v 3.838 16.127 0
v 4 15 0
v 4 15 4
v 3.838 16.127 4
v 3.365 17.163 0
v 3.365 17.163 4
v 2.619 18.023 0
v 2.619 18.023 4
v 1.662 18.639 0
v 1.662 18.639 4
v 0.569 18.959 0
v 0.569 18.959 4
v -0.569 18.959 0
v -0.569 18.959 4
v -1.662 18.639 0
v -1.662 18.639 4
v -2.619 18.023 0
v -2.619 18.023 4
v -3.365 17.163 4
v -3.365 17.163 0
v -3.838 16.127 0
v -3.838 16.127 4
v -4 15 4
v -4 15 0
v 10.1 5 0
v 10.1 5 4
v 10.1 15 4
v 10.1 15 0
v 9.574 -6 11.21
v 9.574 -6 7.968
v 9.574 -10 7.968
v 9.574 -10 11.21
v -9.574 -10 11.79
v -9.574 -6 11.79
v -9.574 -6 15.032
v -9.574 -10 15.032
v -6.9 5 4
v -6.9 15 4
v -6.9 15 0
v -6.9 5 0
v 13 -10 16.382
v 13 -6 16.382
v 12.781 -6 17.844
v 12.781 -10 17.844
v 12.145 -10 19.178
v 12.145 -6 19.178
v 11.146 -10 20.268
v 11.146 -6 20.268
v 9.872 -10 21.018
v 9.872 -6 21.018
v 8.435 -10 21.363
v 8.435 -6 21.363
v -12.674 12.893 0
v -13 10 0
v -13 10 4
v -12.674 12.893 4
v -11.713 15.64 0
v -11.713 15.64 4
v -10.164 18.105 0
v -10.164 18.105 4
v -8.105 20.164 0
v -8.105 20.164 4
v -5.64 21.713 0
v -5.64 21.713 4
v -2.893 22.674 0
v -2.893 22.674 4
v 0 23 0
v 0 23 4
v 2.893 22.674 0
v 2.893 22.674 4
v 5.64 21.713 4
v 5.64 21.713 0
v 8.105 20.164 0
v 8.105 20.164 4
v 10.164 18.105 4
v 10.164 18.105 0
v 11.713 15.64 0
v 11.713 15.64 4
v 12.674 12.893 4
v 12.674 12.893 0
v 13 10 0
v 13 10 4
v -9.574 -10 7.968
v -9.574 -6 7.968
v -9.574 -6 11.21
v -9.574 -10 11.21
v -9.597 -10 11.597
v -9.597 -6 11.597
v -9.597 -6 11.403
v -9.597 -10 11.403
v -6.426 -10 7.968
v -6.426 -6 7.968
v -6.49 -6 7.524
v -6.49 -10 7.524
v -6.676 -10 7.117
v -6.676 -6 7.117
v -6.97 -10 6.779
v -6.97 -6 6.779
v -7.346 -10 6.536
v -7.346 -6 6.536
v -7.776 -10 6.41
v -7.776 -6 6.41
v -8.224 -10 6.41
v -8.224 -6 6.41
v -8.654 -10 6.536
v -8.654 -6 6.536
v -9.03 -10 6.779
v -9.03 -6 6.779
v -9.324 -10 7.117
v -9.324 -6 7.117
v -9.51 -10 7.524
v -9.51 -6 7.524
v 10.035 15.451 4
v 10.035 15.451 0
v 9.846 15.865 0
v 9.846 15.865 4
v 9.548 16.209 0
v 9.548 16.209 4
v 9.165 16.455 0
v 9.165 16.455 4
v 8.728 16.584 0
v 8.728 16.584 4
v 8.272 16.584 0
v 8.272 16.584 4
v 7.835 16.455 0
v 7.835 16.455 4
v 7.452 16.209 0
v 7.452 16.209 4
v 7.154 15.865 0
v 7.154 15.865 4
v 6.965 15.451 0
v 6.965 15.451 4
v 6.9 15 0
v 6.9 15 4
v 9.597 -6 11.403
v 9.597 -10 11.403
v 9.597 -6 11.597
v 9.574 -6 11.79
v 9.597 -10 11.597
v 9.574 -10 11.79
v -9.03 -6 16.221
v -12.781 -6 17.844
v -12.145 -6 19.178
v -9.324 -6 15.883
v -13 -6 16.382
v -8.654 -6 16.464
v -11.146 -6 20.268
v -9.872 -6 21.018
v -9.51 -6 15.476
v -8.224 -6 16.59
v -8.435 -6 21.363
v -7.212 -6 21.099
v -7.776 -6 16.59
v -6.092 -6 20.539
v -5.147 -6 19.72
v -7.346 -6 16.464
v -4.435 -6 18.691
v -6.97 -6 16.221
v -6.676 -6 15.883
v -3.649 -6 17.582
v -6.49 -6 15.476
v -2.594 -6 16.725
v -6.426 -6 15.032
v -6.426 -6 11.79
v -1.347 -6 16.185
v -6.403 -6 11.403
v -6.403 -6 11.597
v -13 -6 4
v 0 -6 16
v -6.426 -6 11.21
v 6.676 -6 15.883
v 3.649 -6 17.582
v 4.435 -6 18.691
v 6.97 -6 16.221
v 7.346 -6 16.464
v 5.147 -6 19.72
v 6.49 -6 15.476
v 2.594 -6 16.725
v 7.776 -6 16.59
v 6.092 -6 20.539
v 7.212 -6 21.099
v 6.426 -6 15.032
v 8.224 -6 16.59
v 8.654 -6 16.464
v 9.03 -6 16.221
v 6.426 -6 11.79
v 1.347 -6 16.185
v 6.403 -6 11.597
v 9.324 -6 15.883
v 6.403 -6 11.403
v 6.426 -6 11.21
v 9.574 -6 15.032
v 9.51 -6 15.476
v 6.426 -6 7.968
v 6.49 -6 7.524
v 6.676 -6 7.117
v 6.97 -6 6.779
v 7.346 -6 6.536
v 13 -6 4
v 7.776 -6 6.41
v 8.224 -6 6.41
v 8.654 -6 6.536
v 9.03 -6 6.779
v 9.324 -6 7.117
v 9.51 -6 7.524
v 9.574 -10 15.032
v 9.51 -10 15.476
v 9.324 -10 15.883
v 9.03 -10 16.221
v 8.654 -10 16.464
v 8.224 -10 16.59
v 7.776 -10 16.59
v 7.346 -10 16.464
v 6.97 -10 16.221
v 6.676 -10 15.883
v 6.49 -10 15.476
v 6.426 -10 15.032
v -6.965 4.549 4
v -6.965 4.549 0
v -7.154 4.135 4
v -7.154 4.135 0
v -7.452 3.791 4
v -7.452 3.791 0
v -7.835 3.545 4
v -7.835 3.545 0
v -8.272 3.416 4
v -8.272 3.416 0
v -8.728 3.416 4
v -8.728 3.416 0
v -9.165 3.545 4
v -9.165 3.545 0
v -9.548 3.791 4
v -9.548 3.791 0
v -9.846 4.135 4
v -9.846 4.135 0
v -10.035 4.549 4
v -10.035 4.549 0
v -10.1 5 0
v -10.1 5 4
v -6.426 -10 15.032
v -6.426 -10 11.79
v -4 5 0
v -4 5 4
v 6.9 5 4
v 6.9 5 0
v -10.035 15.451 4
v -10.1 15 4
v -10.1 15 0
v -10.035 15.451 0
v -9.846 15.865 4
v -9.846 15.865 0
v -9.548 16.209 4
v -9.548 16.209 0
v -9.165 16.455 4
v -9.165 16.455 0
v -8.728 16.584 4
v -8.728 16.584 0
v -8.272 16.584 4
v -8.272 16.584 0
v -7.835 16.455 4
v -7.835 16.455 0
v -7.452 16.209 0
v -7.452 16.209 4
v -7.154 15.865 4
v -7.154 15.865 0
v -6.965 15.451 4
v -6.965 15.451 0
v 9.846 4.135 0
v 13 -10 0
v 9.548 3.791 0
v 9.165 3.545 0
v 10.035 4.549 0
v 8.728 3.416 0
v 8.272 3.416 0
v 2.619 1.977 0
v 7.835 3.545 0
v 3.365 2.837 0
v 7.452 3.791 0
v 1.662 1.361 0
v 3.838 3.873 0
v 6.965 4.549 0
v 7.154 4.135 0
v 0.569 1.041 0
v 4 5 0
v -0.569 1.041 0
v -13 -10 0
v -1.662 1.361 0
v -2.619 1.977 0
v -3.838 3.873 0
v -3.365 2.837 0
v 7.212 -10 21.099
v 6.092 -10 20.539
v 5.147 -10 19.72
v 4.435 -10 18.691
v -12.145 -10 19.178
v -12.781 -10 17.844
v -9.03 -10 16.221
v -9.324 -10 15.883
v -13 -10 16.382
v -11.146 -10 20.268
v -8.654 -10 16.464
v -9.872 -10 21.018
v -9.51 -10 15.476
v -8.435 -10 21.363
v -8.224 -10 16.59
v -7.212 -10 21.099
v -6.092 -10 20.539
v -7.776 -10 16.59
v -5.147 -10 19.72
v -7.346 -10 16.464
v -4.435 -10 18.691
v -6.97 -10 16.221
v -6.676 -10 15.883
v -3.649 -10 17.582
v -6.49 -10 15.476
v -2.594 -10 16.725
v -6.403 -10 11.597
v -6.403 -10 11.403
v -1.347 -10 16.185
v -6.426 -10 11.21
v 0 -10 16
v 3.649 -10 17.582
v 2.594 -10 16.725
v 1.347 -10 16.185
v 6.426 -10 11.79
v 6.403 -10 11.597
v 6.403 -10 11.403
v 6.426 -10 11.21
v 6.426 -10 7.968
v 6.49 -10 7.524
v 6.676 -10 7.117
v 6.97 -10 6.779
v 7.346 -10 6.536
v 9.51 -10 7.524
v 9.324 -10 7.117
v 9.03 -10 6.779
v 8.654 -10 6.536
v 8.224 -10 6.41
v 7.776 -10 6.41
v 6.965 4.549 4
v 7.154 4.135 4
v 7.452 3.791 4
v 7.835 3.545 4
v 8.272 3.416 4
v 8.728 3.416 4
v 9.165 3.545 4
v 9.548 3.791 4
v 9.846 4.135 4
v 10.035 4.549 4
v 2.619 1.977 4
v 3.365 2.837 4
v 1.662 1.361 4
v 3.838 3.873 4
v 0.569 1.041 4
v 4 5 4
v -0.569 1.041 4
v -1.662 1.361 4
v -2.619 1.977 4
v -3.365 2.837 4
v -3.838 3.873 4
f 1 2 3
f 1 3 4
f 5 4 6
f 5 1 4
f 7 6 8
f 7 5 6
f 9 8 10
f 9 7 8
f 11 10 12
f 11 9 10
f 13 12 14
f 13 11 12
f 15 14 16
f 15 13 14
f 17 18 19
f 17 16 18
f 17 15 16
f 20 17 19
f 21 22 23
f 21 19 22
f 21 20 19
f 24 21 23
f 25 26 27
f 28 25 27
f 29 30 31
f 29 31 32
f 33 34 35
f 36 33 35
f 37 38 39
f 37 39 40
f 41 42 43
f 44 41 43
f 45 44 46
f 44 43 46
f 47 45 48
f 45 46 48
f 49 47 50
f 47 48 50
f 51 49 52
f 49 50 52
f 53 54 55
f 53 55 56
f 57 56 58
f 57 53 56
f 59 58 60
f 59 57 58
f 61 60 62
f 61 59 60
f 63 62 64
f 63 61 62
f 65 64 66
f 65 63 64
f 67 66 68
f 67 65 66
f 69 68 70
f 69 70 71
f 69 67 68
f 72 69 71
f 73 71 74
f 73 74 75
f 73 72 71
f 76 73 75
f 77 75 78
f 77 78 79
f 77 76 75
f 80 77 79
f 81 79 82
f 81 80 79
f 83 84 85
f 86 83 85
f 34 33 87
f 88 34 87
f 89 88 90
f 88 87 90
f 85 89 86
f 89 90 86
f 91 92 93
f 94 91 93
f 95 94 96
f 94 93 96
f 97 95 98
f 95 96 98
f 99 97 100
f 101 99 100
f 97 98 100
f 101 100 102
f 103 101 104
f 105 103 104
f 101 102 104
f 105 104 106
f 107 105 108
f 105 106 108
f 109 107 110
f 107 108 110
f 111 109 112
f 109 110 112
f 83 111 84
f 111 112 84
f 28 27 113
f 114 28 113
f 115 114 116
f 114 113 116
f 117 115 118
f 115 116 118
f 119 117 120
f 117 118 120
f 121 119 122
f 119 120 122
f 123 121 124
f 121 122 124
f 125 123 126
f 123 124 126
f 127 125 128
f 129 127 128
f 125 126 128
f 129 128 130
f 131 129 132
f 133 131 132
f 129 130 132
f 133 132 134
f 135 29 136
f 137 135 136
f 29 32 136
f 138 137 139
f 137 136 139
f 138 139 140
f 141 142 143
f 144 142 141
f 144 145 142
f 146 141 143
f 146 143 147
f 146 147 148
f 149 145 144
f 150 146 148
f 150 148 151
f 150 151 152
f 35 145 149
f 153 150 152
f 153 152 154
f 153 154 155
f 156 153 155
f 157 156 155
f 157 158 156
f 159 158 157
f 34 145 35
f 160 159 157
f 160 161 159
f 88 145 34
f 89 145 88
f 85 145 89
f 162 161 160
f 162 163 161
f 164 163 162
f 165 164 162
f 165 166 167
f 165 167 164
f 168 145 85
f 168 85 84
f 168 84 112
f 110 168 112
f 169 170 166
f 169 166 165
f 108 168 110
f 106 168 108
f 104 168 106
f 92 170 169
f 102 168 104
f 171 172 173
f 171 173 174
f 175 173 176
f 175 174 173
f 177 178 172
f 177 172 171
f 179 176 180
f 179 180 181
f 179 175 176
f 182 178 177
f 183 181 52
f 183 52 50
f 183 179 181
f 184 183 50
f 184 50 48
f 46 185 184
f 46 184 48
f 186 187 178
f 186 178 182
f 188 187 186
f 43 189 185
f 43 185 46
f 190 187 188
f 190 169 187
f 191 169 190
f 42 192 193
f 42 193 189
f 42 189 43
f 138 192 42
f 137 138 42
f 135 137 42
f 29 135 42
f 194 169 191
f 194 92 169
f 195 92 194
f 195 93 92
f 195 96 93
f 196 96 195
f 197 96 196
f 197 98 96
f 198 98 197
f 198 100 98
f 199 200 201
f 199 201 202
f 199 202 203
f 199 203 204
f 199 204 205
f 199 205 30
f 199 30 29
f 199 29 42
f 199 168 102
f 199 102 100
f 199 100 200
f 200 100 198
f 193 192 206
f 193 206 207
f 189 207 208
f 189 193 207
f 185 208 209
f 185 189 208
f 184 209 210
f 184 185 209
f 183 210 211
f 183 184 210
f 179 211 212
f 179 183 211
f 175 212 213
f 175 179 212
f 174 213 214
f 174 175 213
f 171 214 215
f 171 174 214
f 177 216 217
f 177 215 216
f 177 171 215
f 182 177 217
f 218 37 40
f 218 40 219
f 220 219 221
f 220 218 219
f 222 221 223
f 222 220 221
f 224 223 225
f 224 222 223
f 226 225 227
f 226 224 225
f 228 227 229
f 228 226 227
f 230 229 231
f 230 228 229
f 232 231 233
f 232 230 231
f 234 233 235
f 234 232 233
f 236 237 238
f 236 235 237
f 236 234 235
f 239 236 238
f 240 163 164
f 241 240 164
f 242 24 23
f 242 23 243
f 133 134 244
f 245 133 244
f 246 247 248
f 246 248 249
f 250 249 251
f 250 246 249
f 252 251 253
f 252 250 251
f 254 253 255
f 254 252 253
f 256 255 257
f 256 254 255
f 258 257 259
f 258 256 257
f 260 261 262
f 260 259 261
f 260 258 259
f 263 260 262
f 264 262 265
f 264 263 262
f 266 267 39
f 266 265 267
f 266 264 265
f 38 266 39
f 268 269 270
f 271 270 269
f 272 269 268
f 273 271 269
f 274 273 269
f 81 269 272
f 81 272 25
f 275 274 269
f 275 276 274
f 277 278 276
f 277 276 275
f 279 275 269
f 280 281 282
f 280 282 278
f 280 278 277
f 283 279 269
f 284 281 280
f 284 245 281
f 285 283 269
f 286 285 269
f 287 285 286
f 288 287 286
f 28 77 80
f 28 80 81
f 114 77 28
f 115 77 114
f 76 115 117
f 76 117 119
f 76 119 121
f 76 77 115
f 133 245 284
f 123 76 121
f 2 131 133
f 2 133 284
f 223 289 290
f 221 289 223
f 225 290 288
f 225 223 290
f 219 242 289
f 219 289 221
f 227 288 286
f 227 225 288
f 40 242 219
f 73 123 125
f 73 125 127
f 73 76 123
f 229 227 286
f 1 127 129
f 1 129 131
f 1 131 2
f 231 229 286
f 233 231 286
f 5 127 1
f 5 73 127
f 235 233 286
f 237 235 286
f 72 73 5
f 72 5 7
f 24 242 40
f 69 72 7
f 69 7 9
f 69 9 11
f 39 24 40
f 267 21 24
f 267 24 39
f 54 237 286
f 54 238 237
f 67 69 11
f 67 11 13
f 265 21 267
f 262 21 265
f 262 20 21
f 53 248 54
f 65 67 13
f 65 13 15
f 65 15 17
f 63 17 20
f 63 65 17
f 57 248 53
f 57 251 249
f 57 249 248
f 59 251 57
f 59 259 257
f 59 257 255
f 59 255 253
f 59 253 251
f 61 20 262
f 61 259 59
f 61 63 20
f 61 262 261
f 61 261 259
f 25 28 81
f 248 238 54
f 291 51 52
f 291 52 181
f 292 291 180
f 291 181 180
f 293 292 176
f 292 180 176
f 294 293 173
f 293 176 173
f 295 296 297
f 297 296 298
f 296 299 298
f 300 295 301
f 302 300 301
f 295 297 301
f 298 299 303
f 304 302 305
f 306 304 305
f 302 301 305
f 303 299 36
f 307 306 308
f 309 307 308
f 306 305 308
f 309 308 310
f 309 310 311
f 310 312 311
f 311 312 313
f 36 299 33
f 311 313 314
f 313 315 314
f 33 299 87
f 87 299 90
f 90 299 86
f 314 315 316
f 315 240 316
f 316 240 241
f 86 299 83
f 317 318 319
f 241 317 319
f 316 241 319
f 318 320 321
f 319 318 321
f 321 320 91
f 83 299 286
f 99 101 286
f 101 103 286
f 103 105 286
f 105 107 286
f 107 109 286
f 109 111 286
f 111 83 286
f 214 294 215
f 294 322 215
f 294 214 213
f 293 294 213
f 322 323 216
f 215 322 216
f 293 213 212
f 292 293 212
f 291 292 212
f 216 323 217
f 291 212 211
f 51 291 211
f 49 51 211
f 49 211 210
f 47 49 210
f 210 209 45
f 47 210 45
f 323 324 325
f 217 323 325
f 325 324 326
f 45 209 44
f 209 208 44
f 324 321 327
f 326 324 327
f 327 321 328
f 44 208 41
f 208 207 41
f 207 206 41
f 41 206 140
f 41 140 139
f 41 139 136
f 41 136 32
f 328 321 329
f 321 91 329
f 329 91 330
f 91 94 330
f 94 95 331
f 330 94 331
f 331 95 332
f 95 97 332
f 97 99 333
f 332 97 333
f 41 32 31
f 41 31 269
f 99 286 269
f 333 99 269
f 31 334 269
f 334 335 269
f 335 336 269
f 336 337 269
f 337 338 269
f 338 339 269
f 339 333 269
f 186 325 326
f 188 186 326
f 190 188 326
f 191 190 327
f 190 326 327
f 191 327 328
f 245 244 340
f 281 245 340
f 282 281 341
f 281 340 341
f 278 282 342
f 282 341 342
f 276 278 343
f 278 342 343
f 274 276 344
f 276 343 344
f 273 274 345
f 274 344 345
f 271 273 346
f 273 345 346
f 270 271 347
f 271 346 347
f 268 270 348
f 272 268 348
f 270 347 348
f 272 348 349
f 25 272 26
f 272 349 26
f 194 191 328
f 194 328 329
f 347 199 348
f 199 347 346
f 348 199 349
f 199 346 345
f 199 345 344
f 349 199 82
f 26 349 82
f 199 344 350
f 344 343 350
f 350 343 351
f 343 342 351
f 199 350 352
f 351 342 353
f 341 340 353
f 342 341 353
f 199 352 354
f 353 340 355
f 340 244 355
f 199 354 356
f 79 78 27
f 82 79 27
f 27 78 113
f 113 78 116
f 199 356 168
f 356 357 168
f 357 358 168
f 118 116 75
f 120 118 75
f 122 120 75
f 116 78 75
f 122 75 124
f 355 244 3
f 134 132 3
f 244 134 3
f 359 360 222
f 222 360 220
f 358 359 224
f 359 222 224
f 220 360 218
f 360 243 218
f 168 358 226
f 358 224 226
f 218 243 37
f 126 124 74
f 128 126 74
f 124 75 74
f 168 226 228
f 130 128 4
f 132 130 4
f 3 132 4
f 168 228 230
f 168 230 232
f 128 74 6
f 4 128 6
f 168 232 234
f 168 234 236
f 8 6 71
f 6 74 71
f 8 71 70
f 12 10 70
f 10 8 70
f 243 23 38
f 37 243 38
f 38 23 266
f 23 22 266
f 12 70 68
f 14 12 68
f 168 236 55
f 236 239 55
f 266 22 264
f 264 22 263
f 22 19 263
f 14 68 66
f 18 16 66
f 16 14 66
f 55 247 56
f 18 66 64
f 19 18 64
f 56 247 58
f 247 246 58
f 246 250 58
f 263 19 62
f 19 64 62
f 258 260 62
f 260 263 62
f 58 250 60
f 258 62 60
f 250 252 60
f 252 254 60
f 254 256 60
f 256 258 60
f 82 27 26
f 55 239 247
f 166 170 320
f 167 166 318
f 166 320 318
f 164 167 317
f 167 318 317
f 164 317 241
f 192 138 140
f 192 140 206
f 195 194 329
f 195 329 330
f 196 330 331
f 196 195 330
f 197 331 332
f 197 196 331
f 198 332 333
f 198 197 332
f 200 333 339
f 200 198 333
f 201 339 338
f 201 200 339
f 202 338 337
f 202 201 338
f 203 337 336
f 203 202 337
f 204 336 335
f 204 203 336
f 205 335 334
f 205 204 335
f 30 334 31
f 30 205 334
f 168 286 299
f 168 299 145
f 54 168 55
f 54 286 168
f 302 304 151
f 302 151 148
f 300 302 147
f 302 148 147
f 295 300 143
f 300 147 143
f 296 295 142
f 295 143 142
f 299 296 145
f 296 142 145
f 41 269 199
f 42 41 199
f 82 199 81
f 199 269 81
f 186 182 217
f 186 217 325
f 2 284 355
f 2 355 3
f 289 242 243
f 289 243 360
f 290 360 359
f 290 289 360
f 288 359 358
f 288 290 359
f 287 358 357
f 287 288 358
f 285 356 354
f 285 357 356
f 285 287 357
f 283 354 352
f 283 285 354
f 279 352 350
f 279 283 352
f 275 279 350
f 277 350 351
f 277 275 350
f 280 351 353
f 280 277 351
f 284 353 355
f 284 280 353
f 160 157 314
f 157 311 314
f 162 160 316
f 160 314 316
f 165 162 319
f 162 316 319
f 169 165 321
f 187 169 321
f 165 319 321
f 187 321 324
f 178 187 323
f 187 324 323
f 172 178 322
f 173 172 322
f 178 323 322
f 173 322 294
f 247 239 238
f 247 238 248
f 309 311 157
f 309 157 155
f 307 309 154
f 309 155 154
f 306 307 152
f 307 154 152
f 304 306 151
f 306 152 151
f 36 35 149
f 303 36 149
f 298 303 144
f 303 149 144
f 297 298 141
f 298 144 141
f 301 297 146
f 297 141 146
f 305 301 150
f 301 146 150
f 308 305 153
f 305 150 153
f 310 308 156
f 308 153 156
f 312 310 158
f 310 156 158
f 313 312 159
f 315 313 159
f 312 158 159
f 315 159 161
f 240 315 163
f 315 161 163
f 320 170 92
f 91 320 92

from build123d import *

# Parameters (mm, degrees)
SKETCH1_R           = 4
SKETCH1_R_2         = 1.6
BOSS_EXTRUDE1_DEPTH = 4
SKETCH2_W           = 26
SKETCH2_H           = 4
BOSS_EXTRUDE2_DEPTH = 33
SKETCH3_R           = 5
SKETCH3_R_2         = 1.6
CUT_EXTRUDE1_DEPTH  = 33
CUT_EXTRUDE2_DEPTH  = 33
CUT_EXTRUDE3_DEPTH  = 5
SKETCH7_W           = 26
SKETCH7_H           = 15.618281376
CUT_EXTRUDE4_DEPTH  = 5
FILLET1_R           = 5
CUT_EXTRUDE5_DEPTH  = 10


with BuildPart() as part:
    # Sketch1 → Boss-Extrude1 (new body)
    with BuildSketch(Plane.XY):
        with BuildLine():
            Line((13, -10), (-13, -10))
            Line((-13, -10), (-13, 10))
            ThreePointArc((-13, 10), (0, 23), (13, 10))
            Line((13, 10), (13, -10))
        make_face()
        with Locations((0, 10)):
            Circle(SKETCH1_R, mode=Mode.SUBTRACT)
        with Locations((-8.5, 10)):
            Circle(SKETCH1_R_2, mode=Mode.SUBTRACT)
        with Locations(Location((8.5, 10, 0), (0, 0, 180))):
            Circle(SKETCH1_R_2, mode=Mode.SUBTRACT)
    extrude(amount=BOSS_EXTRUDE1_DEPTH)

    # Sketch2 → Boss-Extrude2 (add)
    with BuildSketch(Plane.XY.offset(4)):
        with Locations((0, -8)):
            Rectangle(SKETCH2_W, SKETCH2_H)
    extrude(amount=BOSS_EXTRUDE2_DEPTH)

    # Sketch3 → Cut-Extrude1 (cut)
    with BuildSketch(Plane.XZ.offset(10)):
        with Locations((0, 21)):
            Circle(SKETCH3_R)
        with Locations((-8, 25.5)):
            Circle(SKETCH3_R_2)
        with Locations(Location((8, 25.5, 0), (0, 0, 270))):
            Circle(SKETCH3_R_2)
        with Locations((8, 11.5)):
            Circle(SKETCH3_R_2)
        with Locations(Location((-8, 11.5, 0), (0, 0, 270))):
            Circle(SKETCH3_R_2)
    extrude(amount=-CUT_EXTRUDE1_DEPTH, mode=Mode.SUBTRACT)

    # Sketch4 → Cut-Extrude2 (cut)
    with BuildSketch(Plane.XY.offset(4)):
        with BuildLine():
            Line((-10.1, 5), (-10.1, 15))
            ThreePointArc((-10.1, 15), (-8.5, 16.6), (-6.9, 15))
            Line((-6.9, 15), (-6.9, 5))
            ThreePointArc((-6.9, 5), (-8.5, 3.4), (-10.1, 5))
        make_face()
        with BuildLine():
            Line((10.1, 5), (10.1, 15))
            ThreePointArc((10.1, 15), (8.5, 16.6), (6.9, 15))
            Line((6.9, 15), (6.9, 5))
            ThreePointArc((6.9, 5), (8.5, 3.4), (10.1, 5))
        make_face()
    extrude(amount=-CUT_EXTRUDE2_DEPTH, mode=Mode.SUBTRACT)

    # Sketch6 → Cut-Extrude3 (cut)
    with BuildSketch(Plane(origin=(0, -6, 0), x_dir=(1, 0, 0), z_dir=(0, 1, 0))):
        with BuildLine():
            Line((6.42648755, -15.03229904), (6.42648755, -7.96770096))
            ThreePointArc((6.42648755, -7.96770096), (8, -6.39418851), (9.57351245, -7.96770096))
            Line((9.57351245, -7.96770096), (9.57351245, -15.03229904))
            ThreePointArc((9.57351245, -15.03229904), (8, -16.60581149), (6.42648755, -15.03229904))
        make_face()
        with BuildLine():
            Line((-6.42648755, -15.03229904), (-6.42648755, -7.96770096))
            ThreePointArc((-6.42648755, -7.96770096), (-8, -6.39418851), (-9.57351245, -7.96770096))
            Line((-9.57351245, -7.96770096), (-9.57351245, -15.03229904))
            ThreePointArc((-9.57351245, -15.03229904), (-8, -16.60581149), (-6.42648755, -15.03229904))
        make_face()
    extrude(amount=-CUT_EXTRUDE3_DEPTH, mode=Mode.SUBTRACT)

    # Sketch7 → Cut-Extrude4 (cut)
    with BuildSketch(Plane(origin=(0, -6, 0), x_dir=(1, 0, 0), z_dir=(0, 1, 0))):
        with Locations((0, -29.190859312)):
            Rectangle(SKETCH7_W, SKETCH7_H)
    extrude(amount=-CUT_EXTRUDE4_DEPTH, mode=Mode.SUBTRACT)

    # Fillet1
    # the kernel refuses this fillet: 5 mm, written as the material it takes off along each edge
    with BuildSketch(Plane(origin=(-13, 6.5, 21.381718624), x_dir=(0, 0, -1), z_dir=(0, -1, 0))) as fillet1_piece_1:
        with BuildLine():
            CenterArc((FILLET1_R, FILLET1_R), FILLET1_R, 180, 90)
            Line((0, FILLET1_R), (0, 0))
            Line((0, 0), (FILLET1_R, 0))
        make_face()
    extrude(amount=29, mode=Mode.SUBTRACT)
    with BuildSketch(Plane(origin=(13, 6.5, 21.381718624), x_dir=(0, 0, -1), z_dir=(0, -1, 0))) as fillet1_piece_2:
        with BuildLine():
            CenterArc((FILLET1_R, -FILLET1_R), FILLET1_R, 90, 90)
            Line((0, -FILLET1_R), (0, 0))
            Line((0, 0), (FILLET1_R, 0))
        make_face()
    extrude(amount=29, mode=Mode.SUBTRACT)
    with BuildSketch(Plane(origin=(4.985407796, 3.710716282, 21.381718624), x_dir=(-0.20045131167218372, 0, -0.9797036652217348), z_dir=(0, -1, 0))) as fillet1_piece_3:
        with BuildLine():
            CenterArc((4.119908, 4.807706292), FILLET1_R, 191.563351745, 62.494863063)
            Line((-0.778610326, 3.805449733), (0, 0))
            ThreePointArc((0, 0), (1.373302667, 0.192293708), (2.746605333, 0))
        make_face()
    extrude(amount=23.421432563, mode=Mode.SUBTRACT)
    with BuildSketch(Plane(origin=(-4.985407796, 3.710716282, 21.381718624), x_dir=(-1, 0, 0), z_dir=(0, -1, 0))) as fillet1_piece_4:
        with BuildLine():
            CenterArc((3.884286513, 5), FILLET1_R, 207.505136937, 62.494863063)
            ThreePointArc((-0.550560642, 2.690859312), (-0.08688947, 1.383975182), (0, 0))
            Line((0, 0), (3.884286513, 0))
        make_face()
    extrude(amount=23.421432563, mode=Mode.SUBTRACT)

    # Sketch8 → Cut-Extrude5 (cut)
    with BuildSketch(Plane(origin=(0, 0, 0), x_dir=(-1, 0, 0), z_dir=(0, 0, -1))):
        with BuildLine():
            Line((-4, 5), (-4, 15))
            ThreePointArc((-4, 15), (0, 19), (4, 15))
            Line((4, 15), (4, 5))
            ThreePointArc((4, 5), (0, 1), (-4, 5))
        make_face()
    extrude(amount=-CUT_EXTRUDE5_DEPTH, mode=Mode.SUBTRACT)


solid = part.part
